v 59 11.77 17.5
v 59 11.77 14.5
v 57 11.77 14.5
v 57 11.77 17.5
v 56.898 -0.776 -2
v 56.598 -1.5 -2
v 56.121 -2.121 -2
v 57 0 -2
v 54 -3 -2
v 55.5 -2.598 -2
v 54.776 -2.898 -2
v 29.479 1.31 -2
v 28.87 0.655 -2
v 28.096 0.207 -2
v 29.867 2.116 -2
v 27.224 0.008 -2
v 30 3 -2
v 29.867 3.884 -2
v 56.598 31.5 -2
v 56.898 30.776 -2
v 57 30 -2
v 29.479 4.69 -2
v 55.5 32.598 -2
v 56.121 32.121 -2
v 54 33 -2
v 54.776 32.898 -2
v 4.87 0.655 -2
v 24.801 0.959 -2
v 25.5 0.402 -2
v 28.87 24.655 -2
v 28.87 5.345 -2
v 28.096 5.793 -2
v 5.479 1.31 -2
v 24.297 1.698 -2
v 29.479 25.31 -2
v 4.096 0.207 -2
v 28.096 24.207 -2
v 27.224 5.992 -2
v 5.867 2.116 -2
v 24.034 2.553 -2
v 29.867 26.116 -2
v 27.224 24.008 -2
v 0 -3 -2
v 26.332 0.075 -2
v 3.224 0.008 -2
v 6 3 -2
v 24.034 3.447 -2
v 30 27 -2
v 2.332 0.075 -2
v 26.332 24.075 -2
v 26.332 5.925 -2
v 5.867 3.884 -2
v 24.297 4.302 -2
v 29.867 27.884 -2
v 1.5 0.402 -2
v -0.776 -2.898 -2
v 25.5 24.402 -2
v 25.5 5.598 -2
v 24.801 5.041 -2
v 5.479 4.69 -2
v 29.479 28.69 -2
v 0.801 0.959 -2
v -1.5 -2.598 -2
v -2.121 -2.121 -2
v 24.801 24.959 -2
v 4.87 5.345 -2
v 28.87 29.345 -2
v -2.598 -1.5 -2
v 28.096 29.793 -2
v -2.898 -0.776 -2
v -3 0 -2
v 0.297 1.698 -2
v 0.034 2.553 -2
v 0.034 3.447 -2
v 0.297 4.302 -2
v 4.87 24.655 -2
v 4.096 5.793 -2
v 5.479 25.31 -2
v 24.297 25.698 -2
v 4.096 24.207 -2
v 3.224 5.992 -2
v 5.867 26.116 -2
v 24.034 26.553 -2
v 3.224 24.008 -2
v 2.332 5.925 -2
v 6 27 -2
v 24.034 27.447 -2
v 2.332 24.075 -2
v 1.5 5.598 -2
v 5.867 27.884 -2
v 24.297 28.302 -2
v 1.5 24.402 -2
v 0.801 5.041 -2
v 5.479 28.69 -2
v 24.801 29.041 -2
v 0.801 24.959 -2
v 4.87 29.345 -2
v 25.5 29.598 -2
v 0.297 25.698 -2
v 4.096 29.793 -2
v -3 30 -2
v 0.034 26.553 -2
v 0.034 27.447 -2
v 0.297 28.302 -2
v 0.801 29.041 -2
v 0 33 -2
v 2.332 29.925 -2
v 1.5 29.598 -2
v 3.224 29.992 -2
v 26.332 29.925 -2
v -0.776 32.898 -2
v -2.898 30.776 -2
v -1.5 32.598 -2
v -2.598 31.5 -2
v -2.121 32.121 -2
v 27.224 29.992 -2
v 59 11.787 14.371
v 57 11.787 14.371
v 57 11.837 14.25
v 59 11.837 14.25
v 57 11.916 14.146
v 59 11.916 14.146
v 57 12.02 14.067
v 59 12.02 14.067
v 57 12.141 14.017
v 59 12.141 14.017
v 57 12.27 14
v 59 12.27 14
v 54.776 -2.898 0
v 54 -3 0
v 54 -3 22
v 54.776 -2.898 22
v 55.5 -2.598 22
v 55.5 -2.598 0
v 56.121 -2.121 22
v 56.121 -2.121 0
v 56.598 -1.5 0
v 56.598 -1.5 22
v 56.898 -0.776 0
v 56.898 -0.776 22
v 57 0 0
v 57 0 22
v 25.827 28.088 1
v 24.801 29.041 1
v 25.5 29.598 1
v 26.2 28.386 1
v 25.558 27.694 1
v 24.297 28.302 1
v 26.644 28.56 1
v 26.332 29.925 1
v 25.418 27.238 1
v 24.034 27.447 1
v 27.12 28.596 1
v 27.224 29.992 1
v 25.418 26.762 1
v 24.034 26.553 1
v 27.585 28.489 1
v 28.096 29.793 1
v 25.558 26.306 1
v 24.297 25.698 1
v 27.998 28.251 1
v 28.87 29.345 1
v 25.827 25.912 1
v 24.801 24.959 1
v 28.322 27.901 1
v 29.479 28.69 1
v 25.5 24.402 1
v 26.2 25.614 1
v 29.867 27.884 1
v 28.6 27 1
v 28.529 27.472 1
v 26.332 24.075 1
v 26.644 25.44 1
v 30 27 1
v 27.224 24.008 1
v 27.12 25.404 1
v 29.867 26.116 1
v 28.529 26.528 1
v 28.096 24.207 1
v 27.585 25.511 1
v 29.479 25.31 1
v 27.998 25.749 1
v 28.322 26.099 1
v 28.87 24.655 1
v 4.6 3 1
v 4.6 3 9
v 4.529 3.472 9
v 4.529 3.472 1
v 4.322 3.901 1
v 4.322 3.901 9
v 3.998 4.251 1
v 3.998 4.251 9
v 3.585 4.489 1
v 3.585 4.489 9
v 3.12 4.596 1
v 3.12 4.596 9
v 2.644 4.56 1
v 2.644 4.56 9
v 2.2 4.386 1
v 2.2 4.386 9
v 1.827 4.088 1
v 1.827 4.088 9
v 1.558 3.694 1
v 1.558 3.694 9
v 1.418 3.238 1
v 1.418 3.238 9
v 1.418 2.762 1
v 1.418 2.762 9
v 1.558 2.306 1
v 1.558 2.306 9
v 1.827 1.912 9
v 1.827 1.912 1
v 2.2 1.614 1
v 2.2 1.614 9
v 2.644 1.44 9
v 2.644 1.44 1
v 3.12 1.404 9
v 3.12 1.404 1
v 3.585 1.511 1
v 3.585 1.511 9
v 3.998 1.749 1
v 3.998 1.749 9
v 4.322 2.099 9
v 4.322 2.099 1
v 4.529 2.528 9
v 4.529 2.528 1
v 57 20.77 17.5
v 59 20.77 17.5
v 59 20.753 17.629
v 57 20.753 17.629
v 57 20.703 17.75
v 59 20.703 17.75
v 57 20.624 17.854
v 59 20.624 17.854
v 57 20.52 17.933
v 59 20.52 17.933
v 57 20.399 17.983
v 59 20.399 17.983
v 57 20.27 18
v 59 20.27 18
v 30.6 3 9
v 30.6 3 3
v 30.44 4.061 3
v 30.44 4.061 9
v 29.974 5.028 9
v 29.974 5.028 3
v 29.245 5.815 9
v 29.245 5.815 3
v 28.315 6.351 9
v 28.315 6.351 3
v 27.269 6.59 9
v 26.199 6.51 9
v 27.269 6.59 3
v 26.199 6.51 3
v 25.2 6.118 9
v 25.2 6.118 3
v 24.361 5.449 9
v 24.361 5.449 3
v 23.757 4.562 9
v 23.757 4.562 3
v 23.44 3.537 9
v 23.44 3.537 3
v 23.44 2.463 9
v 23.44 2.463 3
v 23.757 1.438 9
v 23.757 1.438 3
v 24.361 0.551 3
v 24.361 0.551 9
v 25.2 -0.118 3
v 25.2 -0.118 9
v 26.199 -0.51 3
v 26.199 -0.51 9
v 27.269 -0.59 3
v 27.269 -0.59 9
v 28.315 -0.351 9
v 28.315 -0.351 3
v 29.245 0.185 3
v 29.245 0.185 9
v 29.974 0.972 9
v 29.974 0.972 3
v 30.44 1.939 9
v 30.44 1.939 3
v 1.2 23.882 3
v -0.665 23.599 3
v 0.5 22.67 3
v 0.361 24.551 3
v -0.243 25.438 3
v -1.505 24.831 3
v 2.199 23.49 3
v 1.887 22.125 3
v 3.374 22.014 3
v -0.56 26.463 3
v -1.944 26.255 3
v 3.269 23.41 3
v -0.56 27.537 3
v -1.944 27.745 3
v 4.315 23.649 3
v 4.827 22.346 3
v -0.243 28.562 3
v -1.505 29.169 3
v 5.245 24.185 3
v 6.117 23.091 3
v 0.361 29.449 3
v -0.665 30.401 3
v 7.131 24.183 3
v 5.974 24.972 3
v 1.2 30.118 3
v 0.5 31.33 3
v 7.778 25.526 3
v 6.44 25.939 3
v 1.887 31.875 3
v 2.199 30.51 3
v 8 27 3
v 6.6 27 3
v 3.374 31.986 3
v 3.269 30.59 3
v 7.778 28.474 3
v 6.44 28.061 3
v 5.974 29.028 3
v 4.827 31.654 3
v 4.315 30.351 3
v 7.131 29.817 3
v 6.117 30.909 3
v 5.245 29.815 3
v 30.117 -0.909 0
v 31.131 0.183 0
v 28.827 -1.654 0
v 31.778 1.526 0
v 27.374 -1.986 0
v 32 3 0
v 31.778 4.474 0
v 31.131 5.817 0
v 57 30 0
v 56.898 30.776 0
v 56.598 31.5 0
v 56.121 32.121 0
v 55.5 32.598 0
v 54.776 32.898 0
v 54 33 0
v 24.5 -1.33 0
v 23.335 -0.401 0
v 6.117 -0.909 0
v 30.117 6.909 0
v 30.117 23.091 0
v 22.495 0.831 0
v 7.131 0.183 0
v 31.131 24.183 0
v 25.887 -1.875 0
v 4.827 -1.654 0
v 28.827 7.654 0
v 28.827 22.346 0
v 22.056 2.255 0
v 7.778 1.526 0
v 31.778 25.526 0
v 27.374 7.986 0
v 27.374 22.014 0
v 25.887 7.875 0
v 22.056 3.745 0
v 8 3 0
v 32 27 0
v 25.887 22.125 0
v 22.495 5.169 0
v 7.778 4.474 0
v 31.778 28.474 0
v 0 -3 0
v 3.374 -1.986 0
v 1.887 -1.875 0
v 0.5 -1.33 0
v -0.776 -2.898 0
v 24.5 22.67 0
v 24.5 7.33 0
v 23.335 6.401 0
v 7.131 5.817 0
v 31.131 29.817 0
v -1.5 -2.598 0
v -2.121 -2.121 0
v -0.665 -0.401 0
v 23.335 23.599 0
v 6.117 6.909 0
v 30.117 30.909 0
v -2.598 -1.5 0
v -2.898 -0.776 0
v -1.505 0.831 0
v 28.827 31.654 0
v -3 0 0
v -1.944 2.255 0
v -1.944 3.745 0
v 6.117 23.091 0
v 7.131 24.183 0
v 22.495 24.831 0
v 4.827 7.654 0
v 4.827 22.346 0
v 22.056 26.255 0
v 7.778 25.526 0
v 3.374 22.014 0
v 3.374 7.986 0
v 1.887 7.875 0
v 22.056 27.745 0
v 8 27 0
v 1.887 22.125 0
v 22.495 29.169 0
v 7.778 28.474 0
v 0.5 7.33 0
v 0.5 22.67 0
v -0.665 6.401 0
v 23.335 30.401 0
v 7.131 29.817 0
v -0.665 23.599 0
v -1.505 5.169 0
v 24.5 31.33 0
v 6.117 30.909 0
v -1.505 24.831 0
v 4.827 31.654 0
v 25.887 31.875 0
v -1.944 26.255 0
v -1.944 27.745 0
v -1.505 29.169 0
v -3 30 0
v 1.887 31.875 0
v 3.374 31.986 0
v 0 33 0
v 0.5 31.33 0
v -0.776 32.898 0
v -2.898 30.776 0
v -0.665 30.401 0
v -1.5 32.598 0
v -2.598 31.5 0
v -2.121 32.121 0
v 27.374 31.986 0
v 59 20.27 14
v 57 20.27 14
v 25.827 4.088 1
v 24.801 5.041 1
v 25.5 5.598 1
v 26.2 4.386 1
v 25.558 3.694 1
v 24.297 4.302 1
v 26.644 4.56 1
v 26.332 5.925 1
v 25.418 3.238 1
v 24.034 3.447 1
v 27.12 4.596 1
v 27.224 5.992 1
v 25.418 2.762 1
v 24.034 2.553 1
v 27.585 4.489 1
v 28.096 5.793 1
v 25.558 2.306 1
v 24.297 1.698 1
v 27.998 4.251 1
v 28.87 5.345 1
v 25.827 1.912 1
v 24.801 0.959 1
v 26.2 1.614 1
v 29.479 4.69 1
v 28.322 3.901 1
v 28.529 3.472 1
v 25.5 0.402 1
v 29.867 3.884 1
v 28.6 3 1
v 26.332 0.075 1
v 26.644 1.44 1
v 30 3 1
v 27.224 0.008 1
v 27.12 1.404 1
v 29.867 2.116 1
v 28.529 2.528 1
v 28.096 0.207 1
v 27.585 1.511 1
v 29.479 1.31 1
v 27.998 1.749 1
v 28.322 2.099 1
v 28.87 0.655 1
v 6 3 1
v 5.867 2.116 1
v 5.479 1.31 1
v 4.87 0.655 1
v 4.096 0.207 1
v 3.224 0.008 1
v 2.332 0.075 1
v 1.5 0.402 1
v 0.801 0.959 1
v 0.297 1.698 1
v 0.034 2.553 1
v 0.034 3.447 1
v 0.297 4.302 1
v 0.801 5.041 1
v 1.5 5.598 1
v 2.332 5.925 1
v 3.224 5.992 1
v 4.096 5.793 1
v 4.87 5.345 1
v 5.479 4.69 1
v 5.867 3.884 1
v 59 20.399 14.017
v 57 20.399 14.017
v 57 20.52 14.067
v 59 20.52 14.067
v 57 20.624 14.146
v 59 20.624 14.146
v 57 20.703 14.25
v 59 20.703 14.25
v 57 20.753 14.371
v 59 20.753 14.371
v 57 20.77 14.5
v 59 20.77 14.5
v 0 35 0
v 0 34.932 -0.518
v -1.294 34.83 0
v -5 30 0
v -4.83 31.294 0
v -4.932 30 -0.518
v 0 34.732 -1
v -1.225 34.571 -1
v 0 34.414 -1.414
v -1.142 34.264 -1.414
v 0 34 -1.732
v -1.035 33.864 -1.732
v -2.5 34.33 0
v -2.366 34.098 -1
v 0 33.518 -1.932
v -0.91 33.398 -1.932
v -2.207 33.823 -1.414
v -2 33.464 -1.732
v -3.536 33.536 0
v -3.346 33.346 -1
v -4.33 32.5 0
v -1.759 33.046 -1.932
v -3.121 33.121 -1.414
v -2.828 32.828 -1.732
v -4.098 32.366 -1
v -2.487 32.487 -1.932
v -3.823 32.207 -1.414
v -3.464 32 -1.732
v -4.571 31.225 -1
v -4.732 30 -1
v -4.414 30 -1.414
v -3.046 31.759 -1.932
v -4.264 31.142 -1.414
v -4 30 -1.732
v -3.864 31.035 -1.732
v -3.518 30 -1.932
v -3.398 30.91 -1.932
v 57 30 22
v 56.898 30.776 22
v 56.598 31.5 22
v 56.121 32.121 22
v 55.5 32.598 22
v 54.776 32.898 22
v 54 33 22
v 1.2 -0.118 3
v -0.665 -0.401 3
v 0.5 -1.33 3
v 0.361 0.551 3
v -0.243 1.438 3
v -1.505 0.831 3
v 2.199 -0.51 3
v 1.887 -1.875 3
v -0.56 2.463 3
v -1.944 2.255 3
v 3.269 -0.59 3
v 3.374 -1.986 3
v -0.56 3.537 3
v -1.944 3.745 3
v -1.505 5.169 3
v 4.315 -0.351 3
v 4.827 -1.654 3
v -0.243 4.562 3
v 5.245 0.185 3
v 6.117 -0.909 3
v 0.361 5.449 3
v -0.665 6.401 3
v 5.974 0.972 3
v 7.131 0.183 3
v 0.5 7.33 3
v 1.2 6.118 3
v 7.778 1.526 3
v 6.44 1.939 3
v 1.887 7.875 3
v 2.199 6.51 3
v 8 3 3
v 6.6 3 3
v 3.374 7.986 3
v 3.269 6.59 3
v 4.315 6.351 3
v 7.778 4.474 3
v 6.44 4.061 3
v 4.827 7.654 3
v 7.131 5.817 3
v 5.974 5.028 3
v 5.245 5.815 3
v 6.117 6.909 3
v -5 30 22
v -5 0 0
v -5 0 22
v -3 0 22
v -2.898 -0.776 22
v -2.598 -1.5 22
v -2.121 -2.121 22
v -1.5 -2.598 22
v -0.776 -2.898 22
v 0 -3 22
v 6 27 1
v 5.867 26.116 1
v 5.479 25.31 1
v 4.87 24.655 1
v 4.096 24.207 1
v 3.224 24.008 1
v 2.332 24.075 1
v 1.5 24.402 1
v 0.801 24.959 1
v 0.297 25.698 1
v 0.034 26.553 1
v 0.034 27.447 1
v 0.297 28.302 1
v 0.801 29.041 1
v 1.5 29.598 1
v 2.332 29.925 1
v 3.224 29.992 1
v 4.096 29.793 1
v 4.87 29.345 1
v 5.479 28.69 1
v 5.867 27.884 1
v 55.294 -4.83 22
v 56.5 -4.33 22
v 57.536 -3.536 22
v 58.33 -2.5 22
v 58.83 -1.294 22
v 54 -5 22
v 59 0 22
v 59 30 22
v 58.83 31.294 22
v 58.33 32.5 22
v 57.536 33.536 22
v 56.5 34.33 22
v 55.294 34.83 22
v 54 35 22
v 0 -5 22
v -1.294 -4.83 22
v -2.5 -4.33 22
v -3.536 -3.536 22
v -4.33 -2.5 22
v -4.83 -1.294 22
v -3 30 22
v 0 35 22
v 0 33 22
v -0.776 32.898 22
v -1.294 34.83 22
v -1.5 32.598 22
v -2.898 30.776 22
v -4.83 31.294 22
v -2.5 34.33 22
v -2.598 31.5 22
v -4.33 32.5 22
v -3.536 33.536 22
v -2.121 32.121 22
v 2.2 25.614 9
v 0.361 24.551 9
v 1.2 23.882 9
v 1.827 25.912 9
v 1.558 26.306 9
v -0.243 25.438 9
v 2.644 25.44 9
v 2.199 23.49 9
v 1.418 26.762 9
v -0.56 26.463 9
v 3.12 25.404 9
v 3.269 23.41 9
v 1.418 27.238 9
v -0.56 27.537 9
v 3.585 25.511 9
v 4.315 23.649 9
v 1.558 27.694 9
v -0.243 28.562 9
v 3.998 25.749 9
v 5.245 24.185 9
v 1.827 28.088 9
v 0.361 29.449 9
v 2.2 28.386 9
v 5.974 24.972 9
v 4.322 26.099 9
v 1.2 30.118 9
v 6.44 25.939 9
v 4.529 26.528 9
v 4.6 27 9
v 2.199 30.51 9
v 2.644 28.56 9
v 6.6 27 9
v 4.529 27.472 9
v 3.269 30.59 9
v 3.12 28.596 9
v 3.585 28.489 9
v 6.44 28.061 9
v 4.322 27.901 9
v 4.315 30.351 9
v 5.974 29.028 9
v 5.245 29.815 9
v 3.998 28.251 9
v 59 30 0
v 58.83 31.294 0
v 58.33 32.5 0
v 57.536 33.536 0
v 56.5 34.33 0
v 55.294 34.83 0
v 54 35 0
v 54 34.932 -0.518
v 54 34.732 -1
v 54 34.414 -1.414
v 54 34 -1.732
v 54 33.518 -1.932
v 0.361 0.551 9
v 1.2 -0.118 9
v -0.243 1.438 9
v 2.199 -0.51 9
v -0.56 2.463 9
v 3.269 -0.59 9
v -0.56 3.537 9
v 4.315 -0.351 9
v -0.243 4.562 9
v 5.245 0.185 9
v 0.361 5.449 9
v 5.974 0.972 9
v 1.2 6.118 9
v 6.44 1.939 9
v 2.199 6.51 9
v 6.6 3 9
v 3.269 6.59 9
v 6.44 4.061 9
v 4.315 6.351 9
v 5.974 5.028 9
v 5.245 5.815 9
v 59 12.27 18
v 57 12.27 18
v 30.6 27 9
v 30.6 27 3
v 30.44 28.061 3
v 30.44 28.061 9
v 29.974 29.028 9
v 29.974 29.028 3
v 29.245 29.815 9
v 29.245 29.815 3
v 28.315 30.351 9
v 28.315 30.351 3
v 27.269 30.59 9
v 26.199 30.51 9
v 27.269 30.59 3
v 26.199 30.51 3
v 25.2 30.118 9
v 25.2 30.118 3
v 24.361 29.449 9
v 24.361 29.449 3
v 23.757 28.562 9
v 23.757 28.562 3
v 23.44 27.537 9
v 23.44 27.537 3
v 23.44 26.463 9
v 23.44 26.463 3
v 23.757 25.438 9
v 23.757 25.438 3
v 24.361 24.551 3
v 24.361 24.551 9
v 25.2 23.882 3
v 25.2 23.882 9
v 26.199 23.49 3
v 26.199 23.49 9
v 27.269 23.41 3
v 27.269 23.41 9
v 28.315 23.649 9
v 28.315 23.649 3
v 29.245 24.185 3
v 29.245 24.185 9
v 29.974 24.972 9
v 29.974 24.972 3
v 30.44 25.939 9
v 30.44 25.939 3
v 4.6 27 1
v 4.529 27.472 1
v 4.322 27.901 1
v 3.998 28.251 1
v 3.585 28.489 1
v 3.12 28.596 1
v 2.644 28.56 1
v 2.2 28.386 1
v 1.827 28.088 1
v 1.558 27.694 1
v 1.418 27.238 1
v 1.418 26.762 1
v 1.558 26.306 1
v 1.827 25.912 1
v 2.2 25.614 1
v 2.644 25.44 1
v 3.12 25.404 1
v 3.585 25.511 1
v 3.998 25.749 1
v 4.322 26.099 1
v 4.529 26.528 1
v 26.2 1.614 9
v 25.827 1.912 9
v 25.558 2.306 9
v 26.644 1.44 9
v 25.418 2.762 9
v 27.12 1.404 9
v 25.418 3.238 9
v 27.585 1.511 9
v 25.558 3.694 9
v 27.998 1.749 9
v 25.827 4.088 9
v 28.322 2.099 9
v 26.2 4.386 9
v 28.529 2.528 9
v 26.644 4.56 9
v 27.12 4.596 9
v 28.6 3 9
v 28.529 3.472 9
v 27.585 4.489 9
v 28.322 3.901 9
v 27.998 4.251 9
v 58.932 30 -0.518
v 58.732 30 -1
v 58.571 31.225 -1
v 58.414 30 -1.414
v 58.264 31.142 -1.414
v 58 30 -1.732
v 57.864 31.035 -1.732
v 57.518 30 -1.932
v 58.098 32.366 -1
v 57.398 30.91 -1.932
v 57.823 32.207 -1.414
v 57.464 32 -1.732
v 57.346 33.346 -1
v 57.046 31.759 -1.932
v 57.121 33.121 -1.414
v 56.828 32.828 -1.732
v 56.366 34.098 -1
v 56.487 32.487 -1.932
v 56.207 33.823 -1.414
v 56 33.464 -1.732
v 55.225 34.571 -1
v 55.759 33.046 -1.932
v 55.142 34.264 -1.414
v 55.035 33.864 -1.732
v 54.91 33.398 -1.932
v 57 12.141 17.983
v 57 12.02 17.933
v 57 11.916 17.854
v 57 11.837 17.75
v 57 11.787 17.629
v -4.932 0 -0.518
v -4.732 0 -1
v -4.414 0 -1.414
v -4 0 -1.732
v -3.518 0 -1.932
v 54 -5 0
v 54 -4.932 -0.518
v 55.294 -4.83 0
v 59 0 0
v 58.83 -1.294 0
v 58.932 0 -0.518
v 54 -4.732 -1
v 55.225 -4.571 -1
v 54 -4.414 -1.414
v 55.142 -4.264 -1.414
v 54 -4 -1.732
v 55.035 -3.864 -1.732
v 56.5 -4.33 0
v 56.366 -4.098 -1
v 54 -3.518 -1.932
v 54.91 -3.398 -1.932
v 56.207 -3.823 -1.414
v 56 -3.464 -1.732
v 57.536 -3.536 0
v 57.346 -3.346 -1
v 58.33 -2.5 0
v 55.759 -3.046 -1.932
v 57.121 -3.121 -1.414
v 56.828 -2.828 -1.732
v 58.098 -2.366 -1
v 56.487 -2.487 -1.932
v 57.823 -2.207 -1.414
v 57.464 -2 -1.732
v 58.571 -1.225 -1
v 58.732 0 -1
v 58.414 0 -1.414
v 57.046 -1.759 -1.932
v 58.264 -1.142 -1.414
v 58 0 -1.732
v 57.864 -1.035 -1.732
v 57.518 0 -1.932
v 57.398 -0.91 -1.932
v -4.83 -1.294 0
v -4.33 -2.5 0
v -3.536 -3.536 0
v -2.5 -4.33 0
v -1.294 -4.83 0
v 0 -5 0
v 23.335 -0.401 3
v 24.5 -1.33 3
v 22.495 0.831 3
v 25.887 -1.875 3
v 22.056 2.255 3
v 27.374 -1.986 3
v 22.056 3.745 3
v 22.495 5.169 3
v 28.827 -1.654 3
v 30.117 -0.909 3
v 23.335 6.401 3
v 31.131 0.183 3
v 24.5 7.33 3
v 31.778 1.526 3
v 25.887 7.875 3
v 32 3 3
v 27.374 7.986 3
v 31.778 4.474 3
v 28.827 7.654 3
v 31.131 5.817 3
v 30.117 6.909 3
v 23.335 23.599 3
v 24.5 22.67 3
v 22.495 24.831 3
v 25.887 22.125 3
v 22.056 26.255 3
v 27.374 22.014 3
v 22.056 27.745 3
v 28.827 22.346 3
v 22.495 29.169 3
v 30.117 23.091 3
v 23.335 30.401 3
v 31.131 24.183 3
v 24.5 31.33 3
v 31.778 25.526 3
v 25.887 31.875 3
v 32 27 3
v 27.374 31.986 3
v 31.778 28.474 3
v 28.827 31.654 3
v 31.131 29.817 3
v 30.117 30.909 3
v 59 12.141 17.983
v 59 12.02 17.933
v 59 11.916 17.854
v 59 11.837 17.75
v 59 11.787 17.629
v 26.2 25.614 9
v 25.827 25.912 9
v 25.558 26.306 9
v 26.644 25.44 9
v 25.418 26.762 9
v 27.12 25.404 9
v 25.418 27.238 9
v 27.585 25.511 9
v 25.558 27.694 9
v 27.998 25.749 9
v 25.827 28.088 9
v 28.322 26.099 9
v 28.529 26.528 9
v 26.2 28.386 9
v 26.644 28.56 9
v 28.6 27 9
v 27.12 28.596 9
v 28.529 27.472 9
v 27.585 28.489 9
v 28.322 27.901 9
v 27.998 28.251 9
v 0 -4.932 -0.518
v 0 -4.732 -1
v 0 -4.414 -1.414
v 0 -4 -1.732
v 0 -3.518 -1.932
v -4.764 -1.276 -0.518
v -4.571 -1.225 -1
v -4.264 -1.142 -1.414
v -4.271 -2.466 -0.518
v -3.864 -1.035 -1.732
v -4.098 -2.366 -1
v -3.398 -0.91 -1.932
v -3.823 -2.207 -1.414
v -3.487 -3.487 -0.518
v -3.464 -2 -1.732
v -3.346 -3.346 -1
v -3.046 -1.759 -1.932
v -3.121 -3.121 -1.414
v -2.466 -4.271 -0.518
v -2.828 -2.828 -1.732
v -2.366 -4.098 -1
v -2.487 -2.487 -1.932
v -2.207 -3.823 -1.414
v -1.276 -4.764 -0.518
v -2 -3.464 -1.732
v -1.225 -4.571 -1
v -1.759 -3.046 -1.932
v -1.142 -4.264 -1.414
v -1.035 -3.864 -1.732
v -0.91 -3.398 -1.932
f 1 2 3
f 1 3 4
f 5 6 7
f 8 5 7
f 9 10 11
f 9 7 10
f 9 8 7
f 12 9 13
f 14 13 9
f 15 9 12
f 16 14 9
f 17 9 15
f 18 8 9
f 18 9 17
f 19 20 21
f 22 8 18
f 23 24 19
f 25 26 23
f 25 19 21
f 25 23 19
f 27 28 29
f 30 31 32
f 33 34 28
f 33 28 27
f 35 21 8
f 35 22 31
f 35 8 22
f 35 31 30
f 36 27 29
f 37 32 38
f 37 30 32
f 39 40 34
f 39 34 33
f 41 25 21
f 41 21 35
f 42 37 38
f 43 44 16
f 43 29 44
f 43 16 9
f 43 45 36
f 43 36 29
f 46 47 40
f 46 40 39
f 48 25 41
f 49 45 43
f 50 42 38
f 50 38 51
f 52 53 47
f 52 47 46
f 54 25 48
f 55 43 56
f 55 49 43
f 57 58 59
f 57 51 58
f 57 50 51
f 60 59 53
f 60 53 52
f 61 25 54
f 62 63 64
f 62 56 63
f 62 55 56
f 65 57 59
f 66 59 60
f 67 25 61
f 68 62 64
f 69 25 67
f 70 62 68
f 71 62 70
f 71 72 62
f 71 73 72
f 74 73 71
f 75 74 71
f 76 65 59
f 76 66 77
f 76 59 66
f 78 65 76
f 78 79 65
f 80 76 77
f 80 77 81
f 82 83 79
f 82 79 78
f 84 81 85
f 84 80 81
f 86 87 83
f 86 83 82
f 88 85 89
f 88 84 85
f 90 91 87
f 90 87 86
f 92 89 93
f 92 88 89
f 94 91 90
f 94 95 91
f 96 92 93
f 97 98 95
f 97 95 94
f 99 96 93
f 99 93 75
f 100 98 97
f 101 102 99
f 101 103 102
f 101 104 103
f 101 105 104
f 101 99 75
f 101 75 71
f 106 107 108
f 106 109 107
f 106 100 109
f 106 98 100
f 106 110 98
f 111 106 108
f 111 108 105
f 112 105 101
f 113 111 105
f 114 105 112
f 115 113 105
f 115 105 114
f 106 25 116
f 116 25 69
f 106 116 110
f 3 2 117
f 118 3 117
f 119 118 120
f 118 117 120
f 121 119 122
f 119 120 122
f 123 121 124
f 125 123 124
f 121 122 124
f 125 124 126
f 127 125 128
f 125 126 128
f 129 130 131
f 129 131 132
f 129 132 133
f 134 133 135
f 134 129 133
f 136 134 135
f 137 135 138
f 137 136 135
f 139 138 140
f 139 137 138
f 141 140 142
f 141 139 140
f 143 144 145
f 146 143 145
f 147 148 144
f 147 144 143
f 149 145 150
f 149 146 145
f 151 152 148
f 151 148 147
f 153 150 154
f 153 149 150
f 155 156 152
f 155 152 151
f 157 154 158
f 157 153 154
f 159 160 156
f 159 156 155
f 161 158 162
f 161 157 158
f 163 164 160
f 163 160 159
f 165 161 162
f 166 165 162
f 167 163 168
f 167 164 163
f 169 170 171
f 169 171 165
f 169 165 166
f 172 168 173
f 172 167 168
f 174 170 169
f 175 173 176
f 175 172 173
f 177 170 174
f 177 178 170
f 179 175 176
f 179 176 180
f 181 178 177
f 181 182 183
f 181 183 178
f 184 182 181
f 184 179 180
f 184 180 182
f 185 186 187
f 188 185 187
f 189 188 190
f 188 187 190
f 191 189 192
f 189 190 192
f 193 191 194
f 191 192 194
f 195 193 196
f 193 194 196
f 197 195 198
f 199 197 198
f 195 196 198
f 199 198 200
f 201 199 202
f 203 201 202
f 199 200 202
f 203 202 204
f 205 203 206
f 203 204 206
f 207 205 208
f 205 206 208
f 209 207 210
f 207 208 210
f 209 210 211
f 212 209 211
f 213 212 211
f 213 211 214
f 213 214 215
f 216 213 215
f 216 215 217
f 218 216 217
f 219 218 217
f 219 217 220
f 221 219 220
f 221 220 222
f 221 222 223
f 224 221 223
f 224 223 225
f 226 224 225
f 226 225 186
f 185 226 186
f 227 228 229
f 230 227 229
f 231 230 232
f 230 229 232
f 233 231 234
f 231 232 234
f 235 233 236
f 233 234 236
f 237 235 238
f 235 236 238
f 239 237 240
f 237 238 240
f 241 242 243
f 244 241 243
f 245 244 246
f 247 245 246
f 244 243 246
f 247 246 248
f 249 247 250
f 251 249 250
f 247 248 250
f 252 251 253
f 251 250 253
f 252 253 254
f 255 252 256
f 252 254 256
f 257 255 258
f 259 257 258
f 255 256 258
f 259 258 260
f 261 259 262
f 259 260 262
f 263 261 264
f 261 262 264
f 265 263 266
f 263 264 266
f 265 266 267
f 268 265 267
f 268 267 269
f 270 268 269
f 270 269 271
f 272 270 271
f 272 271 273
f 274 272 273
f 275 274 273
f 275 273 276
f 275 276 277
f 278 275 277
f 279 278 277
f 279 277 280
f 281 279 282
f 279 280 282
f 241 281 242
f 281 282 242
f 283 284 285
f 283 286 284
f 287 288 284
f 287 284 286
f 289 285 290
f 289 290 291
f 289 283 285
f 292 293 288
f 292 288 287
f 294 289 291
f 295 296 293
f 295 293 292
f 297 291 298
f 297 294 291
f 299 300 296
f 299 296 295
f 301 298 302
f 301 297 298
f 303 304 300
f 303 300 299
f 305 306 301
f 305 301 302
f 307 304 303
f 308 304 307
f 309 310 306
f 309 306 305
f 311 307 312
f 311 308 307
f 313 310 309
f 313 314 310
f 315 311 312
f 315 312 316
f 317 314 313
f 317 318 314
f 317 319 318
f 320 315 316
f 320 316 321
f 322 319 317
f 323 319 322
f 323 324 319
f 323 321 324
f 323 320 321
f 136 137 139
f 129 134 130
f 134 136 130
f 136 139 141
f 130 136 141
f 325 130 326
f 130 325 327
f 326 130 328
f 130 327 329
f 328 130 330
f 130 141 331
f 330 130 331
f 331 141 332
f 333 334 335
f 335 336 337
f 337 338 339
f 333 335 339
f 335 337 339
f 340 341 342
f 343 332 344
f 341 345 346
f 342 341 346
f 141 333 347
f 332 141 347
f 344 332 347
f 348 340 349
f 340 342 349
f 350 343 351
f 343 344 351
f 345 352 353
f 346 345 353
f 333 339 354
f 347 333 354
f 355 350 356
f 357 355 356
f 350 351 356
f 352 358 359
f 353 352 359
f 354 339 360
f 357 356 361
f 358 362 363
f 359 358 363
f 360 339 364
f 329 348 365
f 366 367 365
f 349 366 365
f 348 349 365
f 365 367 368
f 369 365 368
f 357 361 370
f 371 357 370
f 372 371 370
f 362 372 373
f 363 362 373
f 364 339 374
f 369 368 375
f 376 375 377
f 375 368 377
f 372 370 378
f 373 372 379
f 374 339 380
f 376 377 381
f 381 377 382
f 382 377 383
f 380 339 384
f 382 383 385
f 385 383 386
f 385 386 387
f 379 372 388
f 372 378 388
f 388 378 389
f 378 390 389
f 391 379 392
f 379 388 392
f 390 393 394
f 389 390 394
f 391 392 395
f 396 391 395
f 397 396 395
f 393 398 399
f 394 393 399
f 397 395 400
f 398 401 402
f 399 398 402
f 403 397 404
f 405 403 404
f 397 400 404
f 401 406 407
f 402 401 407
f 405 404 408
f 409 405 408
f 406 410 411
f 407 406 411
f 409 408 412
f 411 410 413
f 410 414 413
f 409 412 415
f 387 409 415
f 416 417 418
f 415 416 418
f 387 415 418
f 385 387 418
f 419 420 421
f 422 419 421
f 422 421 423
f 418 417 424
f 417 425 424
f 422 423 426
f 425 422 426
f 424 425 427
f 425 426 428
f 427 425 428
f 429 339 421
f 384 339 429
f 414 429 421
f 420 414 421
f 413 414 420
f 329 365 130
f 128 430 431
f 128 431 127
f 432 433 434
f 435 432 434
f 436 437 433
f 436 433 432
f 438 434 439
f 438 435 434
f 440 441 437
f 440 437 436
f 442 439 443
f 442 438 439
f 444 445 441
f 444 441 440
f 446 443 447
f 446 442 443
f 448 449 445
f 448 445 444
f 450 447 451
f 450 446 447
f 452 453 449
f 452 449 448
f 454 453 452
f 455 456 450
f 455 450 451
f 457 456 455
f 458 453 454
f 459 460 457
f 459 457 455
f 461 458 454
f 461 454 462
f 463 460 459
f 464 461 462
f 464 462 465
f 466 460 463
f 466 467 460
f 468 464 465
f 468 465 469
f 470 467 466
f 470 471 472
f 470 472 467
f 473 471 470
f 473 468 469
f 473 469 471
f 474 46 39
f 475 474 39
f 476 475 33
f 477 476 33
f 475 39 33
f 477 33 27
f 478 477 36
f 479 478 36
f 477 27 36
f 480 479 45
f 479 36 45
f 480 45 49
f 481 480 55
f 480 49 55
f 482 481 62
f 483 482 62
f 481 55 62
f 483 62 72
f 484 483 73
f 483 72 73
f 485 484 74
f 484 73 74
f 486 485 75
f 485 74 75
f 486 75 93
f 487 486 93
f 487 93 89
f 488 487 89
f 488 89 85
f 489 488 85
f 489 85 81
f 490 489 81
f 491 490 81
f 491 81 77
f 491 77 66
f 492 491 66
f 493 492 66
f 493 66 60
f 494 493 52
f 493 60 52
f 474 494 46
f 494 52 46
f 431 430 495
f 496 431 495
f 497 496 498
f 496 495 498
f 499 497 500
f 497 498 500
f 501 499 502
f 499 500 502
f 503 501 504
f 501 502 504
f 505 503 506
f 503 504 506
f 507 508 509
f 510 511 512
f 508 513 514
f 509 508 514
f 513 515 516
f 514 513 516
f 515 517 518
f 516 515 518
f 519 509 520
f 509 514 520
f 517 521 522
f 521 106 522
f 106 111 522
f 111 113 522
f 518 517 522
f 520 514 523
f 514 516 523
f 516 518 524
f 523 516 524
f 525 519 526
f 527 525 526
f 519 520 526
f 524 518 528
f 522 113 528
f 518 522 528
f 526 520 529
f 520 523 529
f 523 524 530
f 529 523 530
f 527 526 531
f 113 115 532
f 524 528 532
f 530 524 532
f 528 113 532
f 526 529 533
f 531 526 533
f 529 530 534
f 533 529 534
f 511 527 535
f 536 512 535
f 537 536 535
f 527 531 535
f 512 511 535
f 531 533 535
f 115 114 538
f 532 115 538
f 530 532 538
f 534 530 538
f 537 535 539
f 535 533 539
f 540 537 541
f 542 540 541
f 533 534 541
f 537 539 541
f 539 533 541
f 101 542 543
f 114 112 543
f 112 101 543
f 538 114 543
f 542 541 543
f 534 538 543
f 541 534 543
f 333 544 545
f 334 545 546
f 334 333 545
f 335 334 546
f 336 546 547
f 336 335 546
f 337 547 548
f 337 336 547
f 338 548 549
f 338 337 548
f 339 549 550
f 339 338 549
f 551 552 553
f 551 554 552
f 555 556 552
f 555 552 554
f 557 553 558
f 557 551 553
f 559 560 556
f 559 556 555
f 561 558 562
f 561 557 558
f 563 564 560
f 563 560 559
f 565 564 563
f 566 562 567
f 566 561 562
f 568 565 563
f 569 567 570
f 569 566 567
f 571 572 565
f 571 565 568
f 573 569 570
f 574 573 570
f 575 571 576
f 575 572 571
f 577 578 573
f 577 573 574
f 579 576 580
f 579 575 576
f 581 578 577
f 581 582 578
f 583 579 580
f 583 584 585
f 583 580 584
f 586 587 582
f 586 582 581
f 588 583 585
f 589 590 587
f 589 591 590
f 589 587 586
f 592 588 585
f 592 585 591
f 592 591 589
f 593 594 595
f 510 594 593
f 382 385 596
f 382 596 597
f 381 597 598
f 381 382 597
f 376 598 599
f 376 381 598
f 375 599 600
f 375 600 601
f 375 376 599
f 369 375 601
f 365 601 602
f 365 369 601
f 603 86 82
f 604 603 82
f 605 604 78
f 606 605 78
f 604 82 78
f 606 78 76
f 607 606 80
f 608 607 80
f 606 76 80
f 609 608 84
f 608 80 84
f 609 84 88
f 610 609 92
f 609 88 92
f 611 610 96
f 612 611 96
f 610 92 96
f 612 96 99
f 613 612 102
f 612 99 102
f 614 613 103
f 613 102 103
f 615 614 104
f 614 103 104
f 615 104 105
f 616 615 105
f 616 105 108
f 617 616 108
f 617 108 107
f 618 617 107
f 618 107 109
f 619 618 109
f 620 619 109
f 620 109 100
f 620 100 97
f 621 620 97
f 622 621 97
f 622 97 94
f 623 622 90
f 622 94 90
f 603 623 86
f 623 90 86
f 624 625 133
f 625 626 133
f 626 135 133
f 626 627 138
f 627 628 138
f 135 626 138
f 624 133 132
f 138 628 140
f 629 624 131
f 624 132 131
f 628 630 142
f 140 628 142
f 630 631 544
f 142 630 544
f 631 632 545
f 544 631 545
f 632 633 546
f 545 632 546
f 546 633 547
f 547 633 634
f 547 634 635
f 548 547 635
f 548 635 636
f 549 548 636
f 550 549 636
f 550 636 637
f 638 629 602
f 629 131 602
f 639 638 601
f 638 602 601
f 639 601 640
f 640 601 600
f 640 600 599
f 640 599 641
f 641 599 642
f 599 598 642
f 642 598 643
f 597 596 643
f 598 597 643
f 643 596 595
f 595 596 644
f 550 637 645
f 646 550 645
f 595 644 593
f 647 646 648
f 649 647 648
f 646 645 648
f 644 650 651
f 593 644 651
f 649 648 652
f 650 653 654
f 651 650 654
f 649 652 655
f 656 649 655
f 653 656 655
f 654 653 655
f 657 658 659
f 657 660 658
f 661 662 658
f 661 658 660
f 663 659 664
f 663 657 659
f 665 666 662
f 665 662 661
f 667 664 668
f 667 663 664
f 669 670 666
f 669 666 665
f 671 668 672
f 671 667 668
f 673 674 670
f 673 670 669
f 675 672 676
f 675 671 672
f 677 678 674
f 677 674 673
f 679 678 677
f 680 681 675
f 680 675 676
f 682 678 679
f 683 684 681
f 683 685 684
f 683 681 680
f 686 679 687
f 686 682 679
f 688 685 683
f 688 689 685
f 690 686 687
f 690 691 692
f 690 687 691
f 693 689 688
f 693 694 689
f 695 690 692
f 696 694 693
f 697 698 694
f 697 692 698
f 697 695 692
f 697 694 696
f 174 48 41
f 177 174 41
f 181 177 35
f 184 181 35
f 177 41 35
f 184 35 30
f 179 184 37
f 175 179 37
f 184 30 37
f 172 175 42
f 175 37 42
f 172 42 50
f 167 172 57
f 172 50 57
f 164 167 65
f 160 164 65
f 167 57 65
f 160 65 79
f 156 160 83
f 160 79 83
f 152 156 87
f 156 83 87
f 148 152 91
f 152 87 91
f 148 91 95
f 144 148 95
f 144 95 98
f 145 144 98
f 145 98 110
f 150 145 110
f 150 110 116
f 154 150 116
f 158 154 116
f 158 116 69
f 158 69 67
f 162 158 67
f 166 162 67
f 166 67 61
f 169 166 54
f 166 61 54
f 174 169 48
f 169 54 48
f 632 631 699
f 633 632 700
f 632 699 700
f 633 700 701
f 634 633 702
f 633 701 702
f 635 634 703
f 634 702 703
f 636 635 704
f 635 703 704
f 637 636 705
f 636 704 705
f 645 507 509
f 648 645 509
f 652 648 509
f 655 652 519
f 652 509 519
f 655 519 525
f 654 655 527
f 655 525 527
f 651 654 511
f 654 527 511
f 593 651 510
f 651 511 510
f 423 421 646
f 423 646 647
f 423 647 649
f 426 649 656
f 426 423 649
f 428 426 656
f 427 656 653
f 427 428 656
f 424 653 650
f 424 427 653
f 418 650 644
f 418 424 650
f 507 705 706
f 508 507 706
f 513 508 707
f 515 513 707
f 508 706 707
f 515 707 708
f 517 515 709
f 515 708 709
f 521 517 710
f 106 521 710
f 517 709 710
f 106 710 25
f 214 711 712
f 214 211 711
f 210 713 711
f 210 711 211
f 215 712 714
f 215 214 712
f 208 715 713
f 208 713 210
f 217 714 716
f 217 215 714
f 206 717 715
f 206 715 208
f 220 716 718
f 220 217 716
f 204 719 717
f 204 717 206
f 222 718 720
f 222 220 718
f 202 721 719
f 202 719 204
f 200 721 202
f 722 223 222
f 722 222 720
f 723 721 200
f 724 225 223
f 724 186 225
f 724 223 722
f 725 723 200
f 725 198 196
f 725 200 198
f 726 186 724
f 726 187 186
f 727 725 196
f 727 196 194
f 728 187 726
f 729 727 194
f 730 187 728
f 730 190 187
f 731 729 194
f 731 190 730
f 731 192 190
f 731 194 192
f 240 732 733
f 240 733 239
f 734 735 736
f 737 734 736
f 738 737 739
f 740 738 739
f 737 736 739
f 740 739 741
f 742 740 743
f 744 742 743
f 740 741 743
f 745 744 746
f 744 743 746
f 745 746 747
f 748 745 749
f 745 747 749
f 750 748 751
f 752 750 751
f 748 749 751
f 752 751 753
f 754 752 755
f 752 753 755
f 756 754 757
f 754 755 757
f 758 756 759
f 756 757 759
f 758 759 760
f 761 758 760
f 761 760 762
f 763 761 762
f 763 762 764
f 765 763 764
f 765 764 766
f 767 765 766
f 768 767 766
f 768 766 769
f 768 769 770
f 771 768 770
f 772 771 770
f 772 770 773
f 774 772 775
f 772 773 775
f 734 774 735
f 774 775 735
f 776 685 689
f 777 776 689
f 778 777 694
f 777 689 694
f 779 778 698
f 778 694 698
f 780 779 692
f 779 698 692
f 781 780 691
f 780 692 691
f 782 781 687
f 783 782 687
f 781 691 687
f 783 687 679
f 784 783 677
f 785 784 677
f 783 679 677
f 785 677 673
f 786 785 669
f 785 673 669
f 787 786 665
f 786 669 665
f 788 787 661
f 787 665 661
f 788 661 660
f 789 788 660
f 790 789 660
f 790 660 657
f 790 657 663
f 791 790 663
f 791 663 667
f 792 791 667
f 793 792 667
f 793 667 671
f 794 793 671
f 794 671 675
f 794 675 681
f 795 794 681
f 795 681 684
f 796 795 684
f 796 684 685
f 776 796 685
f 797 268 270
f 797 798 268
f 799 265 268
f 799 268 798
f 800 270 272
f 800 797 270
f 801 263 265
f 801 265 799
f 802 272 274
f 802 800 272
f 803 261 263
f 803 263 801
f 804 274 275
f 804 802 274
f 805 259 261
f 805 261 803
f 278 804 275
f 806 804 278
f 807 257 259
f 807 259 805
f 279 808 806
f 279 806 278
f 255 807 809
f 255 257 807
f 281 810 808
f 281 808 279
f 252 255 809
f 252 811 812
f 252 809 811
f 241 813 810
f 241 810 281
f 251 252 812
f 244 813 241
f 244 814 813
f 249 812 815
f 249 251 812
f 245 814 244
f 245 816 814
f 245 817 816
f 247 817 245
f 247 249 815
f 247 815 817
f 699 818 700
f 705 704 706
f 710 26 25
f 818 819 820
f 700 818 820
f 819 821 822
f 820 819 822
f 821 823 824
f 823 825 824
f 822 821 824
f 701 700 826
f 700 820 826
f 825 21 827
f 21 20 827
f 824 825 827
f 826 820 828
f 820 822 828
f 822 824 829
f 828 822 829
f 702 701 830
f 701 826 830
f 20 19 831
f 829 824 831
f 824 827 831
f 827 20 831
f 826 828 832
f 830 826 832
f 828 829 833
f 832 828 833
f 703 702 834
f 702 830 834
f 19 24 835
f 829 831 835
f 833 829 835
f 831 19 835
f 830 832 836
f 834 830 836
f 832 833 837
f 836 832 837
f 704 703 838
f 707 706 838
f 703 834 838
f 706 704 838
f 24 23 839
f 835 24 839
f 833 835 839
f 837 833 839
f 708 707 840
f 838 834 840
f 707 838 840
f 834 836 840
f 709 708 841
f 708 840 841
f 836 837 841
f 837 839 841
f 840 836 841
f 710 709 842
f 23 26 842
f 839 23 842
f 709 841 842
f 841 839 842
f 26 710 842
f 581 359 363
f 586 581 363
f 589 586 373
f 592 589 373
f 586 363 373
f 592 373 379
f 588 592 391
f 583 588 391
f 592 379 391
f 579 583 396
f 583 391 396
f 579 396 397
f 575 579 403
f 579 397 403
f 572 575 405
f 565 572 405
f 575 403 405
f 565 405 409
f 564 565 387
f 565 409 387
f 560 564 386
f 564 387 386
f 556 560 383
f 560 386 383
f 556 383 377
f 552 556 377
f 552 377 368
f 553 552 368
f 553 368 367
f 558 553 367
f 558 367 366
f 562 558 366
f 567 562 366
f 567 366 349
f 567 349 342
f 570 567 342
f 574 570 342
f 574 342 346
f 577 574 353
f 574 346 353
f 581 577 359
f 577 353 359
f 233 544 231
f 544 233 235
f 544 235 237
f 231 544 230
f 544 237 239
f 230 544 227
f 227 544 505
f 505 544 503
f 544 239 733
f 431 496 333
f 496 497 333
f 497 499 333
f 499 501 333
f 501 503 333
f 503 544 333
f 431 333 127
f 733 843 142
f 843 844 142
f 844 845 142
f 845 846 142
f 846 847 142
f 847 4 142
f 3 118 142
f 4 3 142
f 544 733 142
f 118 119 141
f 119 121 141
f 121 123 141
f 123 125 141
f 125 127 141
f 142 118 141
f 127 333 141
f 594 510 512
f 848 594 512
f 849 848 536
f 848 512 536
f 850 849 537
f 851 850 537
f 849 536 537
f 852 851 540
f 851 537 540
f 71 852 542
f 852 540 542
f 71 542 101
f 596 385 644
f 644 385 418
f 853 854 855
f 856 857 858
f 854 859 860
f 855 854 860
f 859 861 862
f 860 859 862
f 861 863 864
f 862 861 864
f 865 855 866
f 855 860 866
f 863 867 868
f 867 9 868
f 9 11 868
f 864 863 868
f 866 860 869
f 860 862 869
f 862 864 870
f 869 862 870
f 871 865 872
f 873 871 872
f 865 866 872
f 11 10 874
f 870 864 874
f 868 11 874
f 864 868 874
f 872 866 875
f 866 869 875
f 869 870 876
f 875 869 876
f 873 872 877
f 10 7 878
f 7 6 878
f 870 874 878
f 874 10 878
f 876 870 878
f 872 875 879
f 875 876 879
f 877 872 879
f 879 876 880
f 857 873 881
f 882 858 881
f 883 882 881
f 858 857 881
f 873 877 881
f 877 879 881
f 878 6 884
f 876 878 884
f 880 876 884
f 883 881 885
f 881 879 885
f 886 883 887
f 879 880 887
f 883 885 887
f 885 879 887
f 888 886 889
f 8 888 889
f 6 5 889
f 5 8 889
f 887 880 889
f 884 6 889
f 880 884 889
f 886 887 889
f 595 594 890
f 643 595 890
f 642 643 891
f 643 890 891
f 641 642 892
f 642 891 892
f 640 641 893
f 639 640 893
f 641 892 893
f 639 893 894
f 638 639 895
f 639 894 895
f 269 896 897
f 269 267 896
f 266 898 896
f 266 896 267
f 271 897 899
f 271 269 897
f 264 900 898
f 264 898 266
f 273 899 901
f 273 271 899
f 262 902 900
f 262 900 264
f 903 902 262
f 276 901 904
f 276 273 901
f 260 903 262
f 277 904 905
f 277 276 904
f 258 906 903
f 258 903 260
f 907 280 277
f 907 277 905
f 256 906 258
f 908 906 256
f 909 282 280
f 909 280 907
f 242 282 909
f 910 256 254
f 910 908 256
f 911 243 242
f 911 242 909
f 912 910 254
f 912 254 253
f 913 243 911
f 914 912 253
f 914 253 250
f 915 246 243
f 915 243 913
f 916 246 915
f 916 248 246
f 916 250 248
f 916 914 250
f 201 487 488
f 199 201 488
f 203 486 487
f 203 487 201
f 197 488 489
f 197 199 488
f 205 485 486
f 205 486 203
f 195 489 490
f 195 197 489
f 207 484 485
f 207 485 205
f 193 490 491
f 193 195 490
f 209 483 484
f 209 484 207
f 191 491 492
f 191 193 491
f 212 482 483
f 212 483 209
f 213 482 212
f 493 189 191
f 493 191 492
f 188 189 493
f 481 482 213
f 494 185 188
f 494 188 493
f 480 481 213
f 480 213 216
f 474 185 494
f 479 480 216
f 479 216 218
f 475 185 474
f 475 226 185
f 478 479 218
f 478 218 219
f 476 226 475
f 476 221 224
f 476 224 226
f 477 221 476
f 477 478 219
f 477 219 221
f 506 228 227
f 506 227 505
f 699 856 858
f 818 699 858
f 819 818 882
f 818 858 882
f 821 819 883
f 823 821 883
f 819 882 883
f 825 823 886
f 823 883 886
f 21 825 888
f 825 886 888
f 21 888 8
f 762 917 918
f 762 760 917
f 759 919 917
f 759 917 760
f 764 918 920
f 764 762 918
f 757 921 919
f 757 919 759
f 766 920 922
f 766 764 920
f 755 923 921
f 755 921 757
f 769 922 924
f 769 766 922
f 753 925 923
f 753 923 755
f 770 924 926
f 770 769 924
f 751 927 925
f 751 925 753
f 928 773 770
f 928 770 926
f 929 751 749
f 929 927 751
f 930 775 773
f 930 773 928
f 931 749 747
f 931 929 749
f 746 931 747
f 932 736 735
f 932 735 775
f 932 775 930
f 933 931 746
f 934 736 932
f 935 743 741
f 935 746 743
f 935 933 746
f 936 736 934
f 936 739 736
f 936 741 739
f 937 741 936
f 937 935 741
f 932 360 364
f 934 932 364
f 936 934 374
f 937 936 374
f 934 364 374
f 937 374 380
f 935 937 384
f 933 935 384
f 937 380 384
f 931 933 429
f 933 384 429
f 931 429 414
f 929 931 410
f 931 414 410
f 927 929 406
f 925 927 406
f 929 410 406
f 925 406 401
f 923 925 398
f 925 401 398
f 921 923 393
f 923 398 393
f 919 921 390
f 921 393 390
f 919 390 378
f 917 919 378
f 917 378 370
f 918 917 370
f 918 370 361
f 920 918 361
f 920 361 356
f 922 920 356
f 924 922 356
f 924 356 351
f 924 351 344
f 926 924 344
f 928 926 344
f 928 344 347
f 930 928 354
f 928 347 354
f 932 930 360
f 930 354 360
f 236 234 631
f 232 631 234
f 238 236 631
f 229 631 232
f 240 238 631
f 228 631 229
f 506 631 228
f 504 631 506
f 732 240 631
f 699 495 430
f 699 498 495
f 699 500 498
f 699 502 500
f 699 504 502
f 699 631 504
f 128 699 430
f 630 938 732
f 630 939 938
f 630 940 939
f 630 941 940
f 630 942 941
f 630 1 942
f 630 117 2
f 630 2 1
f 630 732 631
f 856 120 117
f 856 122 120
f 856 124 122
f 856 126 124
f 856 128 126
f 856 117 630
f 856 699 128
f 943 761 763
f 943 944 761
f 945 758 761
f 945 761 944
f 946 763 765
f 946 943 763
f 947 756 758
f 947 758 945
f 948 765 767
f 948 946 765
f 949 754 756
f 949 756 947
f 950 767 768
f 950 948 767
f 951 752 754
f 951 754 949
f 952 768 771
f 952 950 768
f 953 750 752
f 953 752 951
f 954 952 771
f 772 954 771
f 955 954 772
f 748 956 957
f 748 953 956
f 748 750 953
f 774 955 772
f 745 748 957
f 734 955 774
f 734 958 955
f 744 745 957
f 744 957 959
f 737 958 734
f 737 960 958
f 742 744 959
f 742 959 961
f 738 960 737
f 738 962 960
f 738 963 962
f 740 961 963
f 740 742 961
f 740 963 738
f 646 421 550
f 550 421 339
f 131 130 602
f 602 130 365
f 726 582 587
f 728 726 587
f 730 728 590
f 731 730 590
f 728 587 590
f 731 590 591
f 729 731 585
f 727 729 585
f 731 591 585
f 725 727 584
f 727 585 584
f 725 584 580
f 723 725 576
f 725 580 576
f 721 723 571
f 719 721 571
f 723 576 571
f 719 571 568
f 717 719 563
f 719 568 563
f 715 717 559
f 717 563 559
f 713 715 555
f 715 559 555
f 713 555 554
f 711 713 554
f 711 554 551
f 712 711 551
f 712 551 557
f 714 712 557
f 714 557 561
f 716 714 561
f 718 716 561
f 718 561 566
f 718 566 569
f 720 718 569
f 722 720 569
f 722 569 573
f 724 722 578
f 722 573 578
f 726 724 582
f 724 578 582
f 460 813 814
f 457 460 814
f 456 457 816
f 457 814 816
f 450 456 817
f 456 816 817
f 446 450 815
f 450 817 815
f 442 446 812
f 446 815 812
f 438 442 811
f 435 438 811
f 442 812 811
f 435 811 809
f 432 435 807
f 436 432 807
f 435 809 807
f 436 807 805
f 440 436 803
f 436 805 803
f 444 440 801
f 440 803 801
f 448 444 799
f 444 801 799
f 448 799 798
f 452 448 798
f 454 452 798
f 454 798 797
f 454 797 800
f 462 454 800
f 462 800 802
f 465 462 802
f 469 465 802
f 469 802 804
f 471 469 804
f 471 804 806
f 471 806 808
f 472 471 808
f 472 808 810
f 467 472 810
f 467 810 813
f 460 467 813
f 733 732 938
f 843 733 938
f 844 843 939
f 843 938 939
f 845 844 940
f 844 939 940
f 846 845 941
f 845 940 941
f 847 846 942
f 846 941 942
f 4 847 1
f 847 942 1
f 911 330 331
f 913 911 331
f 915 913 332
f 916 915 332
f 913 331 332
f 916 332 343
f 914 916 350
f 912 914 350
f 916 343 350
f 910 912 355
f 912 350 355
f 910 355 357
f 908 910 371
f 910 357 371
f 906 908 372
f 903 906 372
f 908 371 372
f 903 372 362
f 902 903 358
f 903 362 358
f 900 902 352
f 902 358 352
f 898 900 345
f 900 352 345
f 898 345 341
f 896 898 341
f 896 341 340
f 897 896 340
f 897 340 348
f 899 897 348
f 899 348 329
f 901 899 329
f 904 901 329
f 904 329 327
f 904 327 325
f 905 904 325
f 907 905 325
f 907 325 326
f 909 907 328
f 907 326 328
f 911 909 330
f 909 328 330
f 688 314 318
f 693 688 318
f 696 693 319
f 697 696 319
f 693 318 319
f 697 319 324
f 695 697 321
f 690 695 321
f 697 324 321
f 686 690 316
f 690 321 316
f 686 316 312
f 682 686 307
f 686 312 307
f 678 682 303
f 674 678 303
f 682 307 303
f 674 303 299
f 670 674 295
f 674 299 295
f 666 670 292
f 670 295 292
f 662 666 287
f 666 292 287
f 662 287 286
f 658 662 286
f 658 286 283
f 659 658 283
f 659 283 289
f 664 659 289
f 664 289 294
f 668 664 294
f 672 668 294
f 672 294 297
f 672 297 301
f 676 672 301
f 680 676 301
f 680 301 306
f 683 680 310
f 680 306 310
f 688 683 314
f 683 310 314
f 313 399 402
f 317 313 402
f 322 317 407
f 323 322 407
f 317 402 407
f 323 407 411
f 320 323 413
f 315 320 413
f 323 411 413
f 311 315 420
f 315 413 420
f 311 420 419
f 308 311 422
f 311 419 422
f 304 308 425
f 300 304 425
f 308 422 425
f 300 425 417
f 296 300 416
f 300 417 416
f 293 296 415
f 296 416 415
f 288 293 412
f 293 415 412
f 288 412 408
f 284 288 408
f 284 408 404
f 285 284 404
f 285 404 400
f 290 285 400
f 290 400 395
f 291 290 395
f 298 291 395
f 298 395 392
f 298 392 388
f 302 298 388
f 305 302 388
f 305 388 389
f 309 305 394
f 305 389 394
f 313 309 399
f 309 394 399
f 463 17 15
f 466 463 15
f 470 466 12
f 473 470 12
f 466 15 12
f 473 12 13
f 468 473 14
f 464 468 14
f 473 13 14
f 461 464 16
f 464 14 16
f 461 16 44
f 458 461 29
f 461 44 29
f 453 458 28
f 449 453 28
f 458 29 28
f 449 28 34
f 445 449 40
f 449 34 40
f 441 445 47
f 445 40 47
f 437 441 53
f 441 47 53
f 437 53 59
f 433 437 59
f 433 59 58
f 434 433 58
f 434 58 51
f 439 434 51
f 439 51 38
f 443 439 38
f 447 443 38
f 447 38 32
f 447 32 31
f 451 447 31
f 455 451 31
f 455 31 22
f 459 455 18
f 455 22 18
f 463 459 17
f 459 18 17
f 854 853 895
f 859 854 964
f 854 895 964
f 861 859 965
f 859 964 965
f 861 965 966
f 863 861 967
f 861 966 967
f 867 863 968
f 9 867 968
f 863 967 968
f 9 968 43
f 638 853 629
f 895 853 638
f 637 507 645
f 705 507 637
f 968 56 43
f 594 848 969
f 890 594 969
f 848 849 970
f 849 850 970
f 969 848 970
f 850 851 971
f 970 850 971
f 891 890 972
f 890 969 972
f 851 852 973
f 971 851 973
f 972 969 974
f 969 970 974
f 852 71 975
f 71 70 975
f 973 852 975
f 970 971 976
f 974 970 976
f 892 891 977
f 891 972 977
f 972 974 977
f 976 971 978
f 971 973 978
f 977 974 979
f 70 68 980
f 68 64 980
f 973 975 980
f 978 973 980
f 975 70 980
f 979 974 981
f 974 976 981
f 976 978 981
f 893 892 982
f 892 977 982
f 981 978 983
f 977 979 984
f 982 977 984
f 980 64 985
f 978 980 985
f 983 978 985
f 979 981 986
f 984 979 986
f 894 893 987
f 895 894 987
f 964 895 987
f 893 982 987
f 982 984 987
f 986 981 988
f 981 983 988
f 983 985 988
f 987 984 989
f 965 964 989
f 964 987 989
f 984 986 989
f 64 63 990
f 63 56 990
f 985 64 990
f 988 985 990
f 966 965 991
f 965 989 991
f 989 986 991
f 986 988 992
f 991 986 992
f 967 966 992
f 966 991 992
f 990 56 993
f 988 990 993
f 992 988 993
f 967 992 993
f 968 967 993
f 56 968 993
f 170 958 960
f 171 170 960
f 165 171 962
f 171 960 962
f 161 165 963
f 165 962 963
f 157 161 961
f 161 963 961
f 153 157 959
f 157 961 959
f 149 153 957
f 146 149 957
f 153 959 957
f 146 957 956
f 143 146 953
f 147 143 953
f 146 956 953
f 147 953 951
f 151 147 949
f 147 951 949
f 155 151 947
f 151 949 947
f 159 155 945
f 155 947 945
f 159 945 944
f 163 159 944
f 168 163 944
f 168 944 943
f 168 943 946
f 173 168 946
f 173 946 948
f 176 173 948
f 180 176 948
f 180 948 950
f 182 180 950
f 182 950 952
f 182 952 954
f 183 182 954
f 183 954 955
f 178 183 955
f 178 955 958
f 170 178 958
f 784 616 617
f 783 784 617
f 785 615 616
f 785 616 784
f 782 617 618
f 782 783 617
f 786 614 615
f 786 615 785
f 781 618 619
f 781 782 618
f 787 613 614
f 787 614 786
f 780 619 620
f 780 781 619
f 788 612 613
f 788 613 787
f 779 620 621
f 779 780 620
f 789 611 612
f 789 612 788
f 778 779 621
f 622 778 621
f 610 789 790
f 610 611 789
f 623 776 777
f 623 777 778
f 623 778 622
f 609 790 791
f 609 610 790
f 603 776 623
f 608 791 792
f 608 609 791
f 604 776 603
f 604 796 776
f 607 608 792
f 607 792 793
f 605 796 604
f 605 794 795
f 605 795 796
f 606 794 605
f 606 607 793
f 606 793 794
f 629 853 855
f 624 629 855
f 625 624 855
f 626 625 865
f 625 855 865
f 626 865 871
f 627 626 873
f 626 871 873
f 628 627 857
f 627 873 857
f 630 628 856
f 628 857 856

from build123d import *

# Parameters (mm, degrees)
PAD_DEPTH       = 22
THICKNESS_T     = 2
SKETCH001_R     = 5
PAD001_DEPTH    = 3
SKETCH002_R     = 3.6
PAD002_DEPTH    = 6
SKETCH003_R     = 3.6
PAD003_DEPTH    = 6
SKETCH004_R     = 3.6
PAD004_DEPTH    = 6
SKETCH005_R     = 3.6
PAD005_DEPTH    = 6
SKETCH006_R     = 1.6
POCKET_DEPTH    = 11
SKETCH007_R     = 1.6
POCKET001_DEPTH = 11
SKETCH008_R     = 1.6
POCKET002_DEPTH = 11
SKETCH009_R     = 1.6
POCKET003_DEPTH = 11
SKETCH010_R     = 3
POCKET004_DEPTH = 3
POCKET005_DEPTH = 2


with BuildPart() as part:
    # Sketch → Pad (new body)
    with BuildSketch(Plane.XY):
        with BuildLine():
            Line((0, 33), (54, 33))
            ThreePointArc((57, 30), (56.12132, 32.12132), (54, 33))
            Line((57, 30), (57, 0))
            ThreePointArc((54, -3), (56.12132, -2.12132), (57, 0))
            Line((54, -3), (0, -3))
            ThreePointArc((-3, 0), (-2.12132, -2.12132), (0, -3))
            Line((-3, 0), (-3, 30))
            ThreePointArc((0, 33), (-2.12132, 32.12132), (-3, 30))
        make_face()
    extrude(amount=PAD_DEPTH)

    # Thickness
    thickness_openings = [part.faces().sort_by_distance(p)[0] for p in [
        (27, 15, 22),
    ]]
    offset(amount=THICKNESS_T, openings=thickness_openings)

    # Sketch001 → Pad001 (new body)
    with BuildSketch(Plane.XY):
        with Locations((3, 27)):
            Circle(SKETCH001_R)
        with Locations((3, 3)):
            Circle(SKETCH001_R)
        with Locations((27, 27)):
            Circle(SKETCH001_R)
        with Locations((27, 3)):
            Circle(SKETCH001_R)
    extrude(amount=PAD001_DEPTH)

    # Sketch002 → Pad002 (new body)
    with BuildSketch(Plane.XY.offset(3)):
        with Locations((27, 27)):
            Circle(SKETCH002_R)
    extrude(amount=PAD002_DEPTH)

    # Sketch003 → Pad003 (new body)
    with BuildSketch(Plane.XY.offset(3)):
        with Locations((27, 3)):
            Circle(SKETCH003_R)
    extrude(amount=PAD003_DEPTH)

    # Sketch004 → Pad004 (new body)
    with BuildSketch(Plane.XY.offset(3)):
        with Locations((3, 27)):
            Circle(SKETCH004_R)
    extrude(amount=PAD004_DEPTH)

    # Sketch005 → Pad005 (new body)
    with BuildSketch(Plane.XY.offset(3)):
        with Locations((3, 3)):
            Circle(SKETCH005_R)
    extrude(amount=PAD005_DEPTH)

    # Sketch006 → Pocket (cut)
    with BuildSketch(Plane.XY.offset(9)):
        with Locations((27, 27)):
            Circle(SKETCH006_R)
    extrude(amount=-POCKET_DEPTH, mode=Mode.SUBTRACT)

    # Sketch007 → Pocket001 (cut)
    with BuildSketch(Plane.XY.offset(9)):
        with Locations((27, 3)):
            Circle(SKETCH007_R)
    extrude(amount=-POCKET001_DEPTH, mode=Mode.SUBTRACT)

    # Sketch008 → Pocket002 (cut)
    with BuildSketch(Plane.XY.offset(9)):
        with Locations((3, 27)):
            Circle(SKETCH008_R)
    extrude(amount=-POCKET002_DEPTH, mode=Mode.SUBTRACT)

    # Sketch009 → Pocket003 (cut)
    with BuildSketch(Plane.XY.offset(9)):
        with Locations((3, 3)):
            Circle(SKETCH009_R)
    extrude(amount=-POCKET003_DEPTH, mode=Mode.SUBTRACT)

    # Sketch010 → Pocket004 (cut)
    with BuildSketch(Plane(origin=(0, 0, -2), x_dir=(1, 0, 0), z_dir=(0, 0, -1))):
        with Locations((27, -3)):
            Circle(SKETCH010_R)
        with Locations((27, -27)):
            Circle(SKETCH010_R)
        with Locations((3, -3)):
            Circle(SKETCH010_R)
        with Locations((3, -27)):
            Circle(SKETCH010_R)
    extrude(amount=-POCKET004_DEPTH, mode=Mode.SUBTRACT)

    # Sketch011 → Pocket005 (cut)
    with BuildSketch(Plane.YZ.offset(59)):
        with BuildLine():
            Line((12.27, 18), (20.27, 18))
            ThreePointArc((20.77, 17.5), (20.623553, 17.853553), (20.27, 18))
            Line((20.77, 17.5), (20.77, 14.5))
            ThreePointArc((20.27, 14), (20.623553, 14.146447), (20.77, 14.5))
            Line((20.27, 14), (12.27, 14))
            ThreePointArc((11.77, 14.5), (11.916447, 14.146447), (12.27, 14))
            Line((11.77, 14.5), (11.77, 17.5))
            ThreePointArc((12.27, 18), (11.916447, 17.853553), (11.77, 17.5))
        make_face()
    extrude(amount=-POCKET005_DEPTH, mode=Mode.SUBTRACT)


solid = part.part
